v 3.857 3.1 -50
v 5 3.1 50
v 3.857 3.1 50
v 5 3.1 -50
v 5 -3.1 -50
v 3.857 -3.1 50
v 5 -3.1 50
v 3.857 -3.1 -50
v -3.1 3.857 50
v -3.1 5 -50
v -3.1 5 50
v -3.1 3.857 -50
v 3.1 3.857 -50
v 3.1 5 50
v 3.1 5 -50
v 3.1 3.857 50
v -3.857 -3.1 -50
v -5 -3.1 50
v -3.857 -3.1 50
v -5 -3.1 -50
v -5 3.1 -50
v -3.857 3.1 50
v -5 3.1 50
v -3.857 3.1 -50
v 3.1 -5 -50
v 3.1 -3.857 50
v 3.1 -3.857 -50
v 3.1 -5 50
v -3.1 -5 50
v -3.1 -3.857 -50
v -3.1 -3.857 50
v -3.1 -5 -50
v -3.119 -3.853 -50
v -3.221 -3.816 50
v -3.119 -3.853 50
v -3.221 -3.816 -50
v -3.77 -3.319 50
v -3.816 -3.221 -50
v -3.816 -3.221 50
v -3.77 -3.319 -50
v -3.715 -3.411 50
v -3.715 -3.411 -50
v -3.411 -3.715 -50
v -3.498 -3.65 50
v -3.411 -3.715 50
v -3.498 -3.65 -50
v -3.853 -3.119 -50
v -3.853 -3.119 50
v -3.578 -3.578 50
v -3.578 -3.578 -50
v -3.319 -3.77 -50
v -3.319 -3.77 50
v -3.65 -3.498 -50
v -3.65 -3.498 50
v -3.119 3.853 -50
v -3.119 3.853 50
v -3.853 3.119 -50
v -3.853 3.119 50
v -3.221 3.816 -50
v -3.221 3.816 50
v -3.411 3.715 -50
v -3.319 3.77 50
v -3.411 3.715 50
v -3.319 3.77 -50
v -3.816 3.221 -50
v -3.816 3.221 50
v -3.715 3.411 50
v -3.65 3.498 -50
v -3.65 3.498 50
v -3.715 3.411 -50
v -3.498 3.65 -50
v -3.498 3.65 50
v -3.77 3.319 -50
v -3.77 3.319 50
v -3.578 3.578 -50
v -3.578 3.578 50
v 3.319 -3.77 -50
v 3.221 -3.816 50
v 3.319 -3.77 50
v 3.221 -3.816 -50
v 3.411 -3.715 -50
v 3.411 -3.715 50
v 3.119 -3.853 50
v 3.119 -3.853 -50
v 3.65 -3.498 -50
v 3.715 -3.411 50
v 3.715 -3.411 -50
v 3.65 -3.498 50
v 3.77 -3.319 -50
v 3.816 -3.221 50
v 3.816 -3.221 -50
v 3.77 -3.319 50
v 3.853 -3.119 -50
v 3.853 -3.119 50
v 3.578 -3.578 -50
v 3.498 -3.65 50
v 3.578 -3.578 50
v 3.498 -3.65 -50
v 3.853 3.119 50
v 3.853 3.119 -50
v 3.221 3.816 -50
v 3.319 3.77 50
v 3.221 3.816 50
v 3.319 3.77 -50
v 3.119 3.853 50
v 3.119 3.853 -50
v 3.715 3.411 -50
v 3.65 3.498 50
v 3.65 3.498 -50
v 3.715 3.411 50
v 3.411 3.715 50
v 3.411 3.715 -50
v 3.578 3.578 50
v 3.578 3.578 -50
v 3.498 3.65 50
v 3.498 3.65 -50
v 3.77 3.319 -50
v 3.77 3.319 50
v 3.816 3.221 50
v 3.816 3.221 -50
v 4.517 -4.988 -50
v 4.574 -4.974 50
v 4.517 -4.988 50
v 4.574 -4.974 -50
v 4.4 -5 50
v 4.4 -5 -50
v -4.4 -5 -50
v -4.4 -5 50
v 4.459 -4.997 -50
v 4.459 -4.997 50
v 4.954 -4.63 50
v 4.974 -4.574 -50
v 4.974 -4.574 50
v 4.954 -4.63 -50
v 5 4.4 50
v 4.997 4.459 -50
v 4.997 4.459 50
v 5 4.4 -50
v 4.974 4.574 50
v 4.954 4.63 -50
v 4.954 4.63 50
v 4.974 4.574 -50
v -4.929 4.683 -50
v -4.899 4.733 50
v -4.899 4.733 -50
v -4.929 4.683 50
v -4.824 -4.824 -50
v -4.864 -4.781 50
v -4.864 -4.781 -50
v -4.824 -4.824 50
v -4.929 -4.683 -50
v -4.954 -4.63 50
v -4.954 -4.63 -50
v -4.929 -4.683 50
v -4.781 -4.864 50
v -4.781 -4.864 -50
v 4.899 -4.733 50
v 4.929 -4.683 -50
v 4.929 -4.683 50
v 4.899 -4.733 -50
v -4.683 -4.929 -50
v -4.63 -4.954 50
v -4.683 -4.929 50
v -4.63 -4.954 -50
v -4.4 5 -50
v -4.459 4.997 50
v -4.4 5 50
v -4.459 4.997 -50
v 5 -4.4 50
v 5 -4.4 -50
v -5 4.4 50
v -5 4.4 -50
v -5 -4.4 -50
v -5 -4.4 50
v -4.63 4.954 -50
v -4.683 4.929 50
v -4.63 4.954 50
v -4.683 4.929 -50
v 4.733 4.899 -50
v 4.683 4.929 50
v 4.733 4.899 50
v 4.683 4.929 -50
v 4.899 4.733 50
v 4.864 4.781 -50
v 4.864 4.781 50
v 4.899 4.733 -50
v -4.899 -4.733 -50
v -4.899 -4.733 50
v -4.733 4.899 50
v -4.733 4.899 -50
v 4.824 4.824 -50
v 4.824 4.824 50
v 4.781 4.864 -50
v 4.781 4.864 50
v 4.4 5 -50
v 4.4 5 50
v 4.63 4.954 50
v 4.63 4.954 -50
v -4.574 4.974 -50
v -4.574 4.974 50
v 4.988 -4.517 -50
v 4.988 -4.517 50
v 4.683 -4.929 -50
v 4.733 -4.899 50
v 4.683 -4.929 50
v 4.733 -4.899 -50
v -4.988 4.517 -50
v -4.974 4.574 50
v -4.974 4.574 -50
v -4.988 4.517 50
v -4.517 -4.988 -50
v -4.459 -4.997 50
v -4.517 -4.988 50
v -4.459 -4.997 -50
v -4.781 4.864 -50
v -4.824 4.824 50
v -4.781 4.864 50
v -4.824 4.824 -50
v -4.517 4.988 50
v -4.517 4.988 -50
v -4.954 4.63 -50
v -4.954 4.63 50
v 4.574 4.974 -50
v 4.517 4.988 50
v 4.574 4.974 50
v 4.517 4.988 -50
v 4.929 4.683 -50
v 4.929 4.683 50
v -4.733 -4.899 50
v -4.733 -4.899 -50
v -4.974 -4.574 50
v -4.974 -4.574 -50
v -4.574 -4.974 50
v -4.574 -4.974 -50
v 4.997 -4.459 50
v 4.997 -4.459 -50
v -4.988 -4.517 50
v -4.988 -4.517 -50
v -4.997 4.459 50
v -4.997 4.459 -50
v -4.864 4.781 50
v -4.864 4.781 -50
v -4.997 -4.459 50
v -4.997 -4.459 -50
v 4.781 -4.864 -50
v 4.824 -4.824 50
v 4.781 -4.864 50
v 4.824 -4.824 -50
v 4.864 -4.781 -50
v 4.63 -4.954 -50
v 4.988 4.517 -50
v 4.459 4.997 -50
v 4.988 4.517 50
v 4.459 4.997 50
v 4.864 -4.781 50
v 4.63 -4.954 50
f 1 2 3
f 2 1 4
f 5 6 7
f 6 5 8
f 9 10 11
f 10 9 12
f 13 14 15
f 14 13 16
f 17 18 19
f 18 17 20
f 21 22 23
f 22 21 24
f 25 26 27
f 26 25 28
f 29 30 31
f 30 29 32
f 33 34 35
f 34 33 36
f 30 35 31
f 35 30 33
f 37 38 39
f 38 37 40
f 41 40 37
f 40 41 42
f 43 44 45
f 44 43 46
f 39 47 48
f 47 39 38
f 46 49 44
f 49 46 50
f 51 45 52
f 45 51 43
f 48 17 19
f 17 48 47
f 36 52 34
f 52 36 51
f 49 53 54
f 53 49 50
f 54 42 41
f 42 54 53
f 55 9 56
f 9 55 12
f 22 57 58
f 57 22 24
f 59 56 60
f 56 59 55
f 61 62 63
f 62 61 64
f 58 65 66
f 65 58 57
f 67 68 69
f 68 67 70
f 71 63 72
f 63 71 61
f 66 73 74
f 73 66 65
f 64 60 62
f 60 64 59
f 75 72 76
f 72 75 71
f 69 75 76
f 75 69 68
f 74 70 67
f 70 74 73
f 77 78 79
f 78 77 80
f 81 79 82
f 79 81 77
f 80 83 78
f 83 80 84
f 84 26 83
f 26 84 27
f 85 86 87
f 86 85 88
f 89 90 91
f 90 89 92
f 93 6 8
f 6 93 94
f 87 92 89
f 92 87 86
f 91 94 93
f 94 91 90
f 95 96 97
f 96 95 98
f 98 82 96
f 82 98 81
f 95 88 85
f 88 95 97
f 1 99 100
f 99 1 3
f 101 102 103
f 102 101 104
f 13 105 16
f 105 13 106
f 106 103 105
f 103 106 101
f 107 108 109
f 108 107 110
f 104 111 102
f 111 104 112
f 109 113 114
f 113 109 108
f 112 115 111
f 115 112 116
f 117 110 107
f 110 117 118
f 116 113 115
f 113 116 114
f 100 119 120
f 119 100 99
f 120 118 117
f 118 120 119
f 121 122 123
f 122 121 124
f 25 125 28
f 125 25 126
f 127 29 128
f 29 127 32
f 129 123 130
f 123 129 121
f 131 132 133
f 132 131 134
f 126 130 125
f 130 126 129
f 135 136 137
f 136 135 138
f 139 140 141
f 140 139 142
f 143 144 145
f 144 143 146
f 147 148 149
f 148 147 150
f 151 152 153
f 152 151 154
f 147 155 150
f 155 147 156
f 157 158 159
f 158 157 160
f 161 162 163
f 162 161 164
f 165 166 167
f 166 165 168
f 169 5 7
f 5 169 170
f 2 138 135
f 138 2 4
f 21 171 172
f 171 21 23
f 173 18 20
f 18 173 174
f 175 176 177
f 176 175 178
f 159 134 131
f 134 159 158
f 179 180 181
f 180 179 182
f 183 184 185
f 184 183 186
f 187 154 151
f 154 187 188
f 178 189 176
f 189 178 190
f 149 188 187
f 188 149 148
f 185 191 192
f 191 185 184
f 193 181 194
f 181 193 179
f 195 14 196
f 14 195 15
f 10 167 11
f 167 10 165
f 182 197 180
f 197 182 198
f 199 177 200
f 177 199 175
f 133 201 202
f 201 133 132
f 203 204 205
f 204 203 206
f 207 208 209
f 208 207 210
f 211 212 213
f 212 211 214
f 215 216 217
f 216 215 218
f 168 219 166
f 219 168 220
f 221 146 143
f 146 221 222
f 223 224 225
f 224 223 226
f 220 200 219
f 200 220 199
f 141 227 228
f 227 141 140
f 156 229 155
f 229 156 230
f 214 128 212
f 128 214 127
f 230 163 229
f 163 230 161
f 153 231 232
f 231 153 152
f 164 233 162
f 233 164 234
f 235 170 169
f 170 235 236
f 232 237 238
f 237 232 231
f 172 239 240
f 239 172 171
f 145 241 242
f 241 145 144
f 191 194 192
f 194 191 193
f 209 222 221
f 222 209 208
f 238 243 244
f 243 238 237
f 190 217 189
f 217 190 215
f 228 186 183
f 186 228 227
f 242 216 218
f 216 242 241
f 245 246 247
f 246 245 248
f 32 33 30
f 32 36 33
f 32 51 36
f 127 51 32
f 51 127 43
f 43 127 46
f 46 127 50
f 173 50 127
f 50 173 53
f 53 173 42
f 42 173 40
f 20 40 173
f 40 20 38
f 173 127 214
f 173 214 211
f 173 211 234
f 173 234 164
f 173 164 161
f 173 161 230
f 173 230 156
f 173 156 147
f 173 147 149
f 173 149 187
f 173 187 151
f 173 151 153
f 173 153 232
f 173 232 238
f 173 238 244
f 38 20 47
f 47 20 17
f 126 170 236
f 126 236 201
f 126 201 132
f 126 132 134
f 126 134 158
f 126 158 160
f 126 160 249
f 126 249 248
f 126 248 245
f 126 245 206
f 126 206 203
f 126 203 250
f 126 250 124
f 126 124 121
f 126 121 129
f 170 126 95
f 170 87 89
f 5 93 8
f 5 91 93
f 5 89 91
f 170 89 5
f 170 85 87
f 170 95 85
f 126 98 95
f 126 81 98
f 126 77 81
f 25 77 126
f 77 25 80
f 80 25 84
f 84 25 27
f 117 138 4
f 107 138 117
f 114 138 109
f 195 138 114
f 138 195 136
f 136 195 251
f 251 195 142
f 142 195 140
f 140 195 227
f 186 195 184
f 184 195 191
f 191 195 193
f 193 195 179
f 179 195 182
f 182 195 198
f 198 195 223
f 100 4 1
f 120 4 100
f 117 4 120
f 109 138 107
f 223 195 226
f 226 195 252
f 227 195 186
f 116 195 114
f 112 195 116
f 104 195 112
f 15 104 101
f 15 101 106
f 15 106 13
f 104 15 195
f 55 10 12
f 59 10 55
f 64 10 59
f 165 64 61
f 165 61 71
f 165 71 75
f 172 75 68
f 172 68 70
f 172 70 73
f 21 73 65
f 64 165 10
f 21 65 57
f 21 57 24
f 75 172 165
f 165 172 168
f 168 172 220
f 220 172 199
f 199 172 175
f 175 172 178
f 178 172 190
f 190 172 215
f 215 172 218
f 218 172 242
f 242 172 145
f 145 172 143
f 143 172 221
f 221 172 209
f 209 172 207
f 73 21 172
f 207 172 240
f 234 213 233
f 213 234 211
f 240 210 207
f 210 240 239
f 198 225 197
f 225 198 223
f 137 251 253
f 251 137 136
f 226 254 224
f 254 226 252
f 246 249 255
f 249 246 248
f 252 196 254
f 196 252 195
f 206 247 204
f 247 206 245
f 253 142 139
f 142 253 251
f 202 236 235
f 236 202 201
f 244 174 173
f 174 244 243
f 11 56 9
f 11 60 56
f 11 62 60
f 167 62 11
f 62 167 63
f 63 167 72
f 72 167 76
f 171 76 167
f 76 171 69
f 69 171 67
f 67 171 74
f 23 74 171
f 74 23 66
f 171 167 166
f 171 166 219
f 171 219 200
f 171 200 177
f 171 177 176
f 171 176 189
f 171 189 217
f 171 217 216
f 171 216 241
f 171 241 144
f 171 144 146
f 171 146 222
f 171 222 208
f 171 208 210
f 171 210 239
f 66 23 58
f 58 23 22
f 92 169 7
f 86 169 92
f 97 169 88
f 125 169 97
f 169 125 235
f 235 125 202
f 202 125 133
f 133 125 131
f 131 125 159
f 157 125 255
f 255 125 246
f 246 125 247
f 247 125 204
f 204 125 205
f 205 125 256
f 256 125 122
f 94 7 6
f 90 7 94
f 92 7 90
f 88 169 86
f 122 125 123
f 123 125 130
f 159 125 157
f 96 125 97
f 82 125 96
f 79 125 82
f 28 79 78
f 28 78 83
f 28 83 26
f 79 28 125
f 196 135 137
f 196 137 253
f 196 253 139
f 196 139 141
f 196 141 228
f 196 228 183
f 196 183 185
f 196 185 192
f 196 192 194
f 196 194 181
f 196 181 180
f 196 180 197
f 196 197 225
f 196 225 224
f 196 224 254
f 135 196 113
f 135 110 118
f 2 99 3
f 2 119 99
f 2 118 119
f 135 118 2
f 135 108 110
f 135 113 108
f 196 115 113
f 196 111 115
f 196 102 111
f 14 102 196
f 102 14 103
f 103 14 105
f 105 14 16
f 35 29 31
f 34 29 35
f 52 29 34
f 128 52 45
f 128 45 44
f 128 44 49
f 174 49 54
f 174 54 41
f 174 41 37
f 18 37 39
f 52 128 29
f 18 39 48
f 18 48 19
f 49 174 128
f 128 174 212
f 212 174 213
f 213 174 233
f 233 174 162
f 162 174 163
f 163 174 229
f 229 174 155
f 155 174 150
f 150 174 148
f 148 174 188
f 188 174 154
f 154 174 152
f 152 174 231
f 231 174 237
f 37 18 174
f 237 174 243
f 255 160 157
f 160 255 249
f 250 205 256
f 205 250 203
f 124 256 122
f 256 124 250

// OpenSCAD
// 10x10mm aluminium extrusion profile, 100mm long
// STRUCTURAL FIXES:
// - Remove the split "two halves" construction that can create two disconnected long bars
// - Build ONE continuous 10x10 outer body
// - Keep all features as subtractive cuts
// - Use union() for a single solid and add small overlaps (1–2mm) only where needed for cuts

$fn = 64;

// Exact target dimensions
cross_section_width_mm  = 10.0;
cross_section_height_mm = 10.0;
length_mm               = 100.0;

// Feature parameters (kept reasonable for a 10x10 profile)
corner_r_mm                 = 0.6;
t_slot_opening_width_mm     = 3.2;
t_slot_inner_width_mm       = 6.2;
t_slot_depth_mm             = 3.6;
t_slot_neck_depth_mm        = 1.6;
center_bore_diameter_mm     = 4.2;
corner_hole_diameter_mm     = 2.2;
corner_hole_offset_mm       = 2.2;

cornerHole = 1;

eps = 0.02;                 // small numeric epsilon
cut_overlap_mm = 1.5;        // 1–2mm overlap for through-cuts / guaranteed intersection

// Rounded rectangle prism (exact outer size)
module rounded_box(size=[10,10,100], r=0.6, center=true) {
    w = size[0]; h = size[1]; l = size[2];
    rr = min(r, min(w,h)/2 - eps);

    translate(center ? [0,0,0] : [w/2, h/2, l/2])
        linear_extrude(height=l, center=true, convexity=10)
            offset(r=rr)
                square([w-2*rr, h-2*rr], center=true);
}

// One connected extrusion solid
module extrusion_10x10_L100() {
    color("Silver")
    difference() {
        // SINGLE connected 10x10 body (fixes floating/split halves)
        union() {
            rounded_box([cross_section_width_mm,
                         cross_section_height_mm,
                         length_mm], r=corner_r_mm, center=true);
        }

        // Through-cut helper length (ensures cutters fully intersect body)
        cut_h = length_mm + 2*cut_overlap_mm;

        // Center bore (through along Z)
        cylinder(d=center_bore_diameter_mm, h=cut_h, center=true);

        // T-slots (4 sides), cut from the body
        for (a = [0, 90, 180, 270]) {
            rotate([0,0,a]) {
                // Place cutters so they definitely reach/overlap the outer surface.
                // Use a small outward bias (cut_overlap_mm/2) to guarantee intersection.
                neck_x  = cross_section_width_mm/2 - t_slot_neck_depth_mm/2 + cut_overlap_mm/2;
                inner_x = cross_section_width_mm/2 - t_slot_depth_mm/2      + cut_overlap_mm/2;

                // Neck (opening)
                translate([neck_x, 0, 0])
                    cube([t_slot_neck_depth_mm + cut_overlap_mm,
                          t_slot_opening_width_mm,
                          cut_h], center=true);

                // Inner cavity
                translate([inner_x, 0, 0])
                    cube([t_slot_depth_mm + cut_overlap_mm,
                          t_slot_inner_width_mm,
                          cut_h], center=true);
            }
        }

        // Corner holes (optional), through along Z
        if (cornerHole) {
            for (sx = [-1, 1], sy = [-1, 1]) {
                translate([sx*(cross_section_width_mm/2  - corner_hole_offset_mm),
                           sy*(cross_section_height_mm/2 - corner_hole_offset_mm),
                           0])
                    cylinder(d=corner_hole_diameter_mm, h=cut_h, center=true);
            }
        }
    }
}

union() {
    extrusion_10x10_L100();
}
